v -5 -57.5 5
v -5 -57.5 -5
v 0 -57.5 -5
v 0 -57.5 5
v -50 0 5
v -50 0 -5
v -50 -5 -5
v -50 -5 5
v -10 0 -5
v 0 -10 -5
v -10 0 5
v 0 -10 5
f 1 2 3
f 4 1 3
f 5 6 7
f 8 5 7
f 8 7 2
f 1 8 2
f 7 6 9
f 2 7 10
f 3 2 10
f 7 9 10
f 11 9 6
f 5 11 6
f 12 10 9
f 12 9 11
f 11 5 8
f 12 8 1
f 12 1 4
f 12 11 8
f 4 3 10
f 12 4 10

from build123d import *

# Parameters (mm, degrees)
SM_START               = -5
SM_BASE_FLANGE_1_DEPTH = 10
CHAMFER_1_SIZE         = 10


# Read off the part's stored shape, not the designer's step: Базовая кромка1
with BuildPart() as part:
    # Базовая кромка1 outline → Базовая кромка1 (new body)
    with BuildSketch(Plane.XY.offset(SM_START)):
        Polygon((0, 0), (-50, 0), (-50, -5), (-5, -57.5), (0, -57.5), align=None)
    extrude(amount=SM_BASE_FLANGE_1_DEPTH)

    # Фаска1
    chamfer_1_edges = [part.edges().sort_by_distance(p)[0] for p in [
        (0, 0, 0),
    ]]
    chamfer(chamfer_1_edges, length=CHAMFER_1_SIZE)


solid = part.part
